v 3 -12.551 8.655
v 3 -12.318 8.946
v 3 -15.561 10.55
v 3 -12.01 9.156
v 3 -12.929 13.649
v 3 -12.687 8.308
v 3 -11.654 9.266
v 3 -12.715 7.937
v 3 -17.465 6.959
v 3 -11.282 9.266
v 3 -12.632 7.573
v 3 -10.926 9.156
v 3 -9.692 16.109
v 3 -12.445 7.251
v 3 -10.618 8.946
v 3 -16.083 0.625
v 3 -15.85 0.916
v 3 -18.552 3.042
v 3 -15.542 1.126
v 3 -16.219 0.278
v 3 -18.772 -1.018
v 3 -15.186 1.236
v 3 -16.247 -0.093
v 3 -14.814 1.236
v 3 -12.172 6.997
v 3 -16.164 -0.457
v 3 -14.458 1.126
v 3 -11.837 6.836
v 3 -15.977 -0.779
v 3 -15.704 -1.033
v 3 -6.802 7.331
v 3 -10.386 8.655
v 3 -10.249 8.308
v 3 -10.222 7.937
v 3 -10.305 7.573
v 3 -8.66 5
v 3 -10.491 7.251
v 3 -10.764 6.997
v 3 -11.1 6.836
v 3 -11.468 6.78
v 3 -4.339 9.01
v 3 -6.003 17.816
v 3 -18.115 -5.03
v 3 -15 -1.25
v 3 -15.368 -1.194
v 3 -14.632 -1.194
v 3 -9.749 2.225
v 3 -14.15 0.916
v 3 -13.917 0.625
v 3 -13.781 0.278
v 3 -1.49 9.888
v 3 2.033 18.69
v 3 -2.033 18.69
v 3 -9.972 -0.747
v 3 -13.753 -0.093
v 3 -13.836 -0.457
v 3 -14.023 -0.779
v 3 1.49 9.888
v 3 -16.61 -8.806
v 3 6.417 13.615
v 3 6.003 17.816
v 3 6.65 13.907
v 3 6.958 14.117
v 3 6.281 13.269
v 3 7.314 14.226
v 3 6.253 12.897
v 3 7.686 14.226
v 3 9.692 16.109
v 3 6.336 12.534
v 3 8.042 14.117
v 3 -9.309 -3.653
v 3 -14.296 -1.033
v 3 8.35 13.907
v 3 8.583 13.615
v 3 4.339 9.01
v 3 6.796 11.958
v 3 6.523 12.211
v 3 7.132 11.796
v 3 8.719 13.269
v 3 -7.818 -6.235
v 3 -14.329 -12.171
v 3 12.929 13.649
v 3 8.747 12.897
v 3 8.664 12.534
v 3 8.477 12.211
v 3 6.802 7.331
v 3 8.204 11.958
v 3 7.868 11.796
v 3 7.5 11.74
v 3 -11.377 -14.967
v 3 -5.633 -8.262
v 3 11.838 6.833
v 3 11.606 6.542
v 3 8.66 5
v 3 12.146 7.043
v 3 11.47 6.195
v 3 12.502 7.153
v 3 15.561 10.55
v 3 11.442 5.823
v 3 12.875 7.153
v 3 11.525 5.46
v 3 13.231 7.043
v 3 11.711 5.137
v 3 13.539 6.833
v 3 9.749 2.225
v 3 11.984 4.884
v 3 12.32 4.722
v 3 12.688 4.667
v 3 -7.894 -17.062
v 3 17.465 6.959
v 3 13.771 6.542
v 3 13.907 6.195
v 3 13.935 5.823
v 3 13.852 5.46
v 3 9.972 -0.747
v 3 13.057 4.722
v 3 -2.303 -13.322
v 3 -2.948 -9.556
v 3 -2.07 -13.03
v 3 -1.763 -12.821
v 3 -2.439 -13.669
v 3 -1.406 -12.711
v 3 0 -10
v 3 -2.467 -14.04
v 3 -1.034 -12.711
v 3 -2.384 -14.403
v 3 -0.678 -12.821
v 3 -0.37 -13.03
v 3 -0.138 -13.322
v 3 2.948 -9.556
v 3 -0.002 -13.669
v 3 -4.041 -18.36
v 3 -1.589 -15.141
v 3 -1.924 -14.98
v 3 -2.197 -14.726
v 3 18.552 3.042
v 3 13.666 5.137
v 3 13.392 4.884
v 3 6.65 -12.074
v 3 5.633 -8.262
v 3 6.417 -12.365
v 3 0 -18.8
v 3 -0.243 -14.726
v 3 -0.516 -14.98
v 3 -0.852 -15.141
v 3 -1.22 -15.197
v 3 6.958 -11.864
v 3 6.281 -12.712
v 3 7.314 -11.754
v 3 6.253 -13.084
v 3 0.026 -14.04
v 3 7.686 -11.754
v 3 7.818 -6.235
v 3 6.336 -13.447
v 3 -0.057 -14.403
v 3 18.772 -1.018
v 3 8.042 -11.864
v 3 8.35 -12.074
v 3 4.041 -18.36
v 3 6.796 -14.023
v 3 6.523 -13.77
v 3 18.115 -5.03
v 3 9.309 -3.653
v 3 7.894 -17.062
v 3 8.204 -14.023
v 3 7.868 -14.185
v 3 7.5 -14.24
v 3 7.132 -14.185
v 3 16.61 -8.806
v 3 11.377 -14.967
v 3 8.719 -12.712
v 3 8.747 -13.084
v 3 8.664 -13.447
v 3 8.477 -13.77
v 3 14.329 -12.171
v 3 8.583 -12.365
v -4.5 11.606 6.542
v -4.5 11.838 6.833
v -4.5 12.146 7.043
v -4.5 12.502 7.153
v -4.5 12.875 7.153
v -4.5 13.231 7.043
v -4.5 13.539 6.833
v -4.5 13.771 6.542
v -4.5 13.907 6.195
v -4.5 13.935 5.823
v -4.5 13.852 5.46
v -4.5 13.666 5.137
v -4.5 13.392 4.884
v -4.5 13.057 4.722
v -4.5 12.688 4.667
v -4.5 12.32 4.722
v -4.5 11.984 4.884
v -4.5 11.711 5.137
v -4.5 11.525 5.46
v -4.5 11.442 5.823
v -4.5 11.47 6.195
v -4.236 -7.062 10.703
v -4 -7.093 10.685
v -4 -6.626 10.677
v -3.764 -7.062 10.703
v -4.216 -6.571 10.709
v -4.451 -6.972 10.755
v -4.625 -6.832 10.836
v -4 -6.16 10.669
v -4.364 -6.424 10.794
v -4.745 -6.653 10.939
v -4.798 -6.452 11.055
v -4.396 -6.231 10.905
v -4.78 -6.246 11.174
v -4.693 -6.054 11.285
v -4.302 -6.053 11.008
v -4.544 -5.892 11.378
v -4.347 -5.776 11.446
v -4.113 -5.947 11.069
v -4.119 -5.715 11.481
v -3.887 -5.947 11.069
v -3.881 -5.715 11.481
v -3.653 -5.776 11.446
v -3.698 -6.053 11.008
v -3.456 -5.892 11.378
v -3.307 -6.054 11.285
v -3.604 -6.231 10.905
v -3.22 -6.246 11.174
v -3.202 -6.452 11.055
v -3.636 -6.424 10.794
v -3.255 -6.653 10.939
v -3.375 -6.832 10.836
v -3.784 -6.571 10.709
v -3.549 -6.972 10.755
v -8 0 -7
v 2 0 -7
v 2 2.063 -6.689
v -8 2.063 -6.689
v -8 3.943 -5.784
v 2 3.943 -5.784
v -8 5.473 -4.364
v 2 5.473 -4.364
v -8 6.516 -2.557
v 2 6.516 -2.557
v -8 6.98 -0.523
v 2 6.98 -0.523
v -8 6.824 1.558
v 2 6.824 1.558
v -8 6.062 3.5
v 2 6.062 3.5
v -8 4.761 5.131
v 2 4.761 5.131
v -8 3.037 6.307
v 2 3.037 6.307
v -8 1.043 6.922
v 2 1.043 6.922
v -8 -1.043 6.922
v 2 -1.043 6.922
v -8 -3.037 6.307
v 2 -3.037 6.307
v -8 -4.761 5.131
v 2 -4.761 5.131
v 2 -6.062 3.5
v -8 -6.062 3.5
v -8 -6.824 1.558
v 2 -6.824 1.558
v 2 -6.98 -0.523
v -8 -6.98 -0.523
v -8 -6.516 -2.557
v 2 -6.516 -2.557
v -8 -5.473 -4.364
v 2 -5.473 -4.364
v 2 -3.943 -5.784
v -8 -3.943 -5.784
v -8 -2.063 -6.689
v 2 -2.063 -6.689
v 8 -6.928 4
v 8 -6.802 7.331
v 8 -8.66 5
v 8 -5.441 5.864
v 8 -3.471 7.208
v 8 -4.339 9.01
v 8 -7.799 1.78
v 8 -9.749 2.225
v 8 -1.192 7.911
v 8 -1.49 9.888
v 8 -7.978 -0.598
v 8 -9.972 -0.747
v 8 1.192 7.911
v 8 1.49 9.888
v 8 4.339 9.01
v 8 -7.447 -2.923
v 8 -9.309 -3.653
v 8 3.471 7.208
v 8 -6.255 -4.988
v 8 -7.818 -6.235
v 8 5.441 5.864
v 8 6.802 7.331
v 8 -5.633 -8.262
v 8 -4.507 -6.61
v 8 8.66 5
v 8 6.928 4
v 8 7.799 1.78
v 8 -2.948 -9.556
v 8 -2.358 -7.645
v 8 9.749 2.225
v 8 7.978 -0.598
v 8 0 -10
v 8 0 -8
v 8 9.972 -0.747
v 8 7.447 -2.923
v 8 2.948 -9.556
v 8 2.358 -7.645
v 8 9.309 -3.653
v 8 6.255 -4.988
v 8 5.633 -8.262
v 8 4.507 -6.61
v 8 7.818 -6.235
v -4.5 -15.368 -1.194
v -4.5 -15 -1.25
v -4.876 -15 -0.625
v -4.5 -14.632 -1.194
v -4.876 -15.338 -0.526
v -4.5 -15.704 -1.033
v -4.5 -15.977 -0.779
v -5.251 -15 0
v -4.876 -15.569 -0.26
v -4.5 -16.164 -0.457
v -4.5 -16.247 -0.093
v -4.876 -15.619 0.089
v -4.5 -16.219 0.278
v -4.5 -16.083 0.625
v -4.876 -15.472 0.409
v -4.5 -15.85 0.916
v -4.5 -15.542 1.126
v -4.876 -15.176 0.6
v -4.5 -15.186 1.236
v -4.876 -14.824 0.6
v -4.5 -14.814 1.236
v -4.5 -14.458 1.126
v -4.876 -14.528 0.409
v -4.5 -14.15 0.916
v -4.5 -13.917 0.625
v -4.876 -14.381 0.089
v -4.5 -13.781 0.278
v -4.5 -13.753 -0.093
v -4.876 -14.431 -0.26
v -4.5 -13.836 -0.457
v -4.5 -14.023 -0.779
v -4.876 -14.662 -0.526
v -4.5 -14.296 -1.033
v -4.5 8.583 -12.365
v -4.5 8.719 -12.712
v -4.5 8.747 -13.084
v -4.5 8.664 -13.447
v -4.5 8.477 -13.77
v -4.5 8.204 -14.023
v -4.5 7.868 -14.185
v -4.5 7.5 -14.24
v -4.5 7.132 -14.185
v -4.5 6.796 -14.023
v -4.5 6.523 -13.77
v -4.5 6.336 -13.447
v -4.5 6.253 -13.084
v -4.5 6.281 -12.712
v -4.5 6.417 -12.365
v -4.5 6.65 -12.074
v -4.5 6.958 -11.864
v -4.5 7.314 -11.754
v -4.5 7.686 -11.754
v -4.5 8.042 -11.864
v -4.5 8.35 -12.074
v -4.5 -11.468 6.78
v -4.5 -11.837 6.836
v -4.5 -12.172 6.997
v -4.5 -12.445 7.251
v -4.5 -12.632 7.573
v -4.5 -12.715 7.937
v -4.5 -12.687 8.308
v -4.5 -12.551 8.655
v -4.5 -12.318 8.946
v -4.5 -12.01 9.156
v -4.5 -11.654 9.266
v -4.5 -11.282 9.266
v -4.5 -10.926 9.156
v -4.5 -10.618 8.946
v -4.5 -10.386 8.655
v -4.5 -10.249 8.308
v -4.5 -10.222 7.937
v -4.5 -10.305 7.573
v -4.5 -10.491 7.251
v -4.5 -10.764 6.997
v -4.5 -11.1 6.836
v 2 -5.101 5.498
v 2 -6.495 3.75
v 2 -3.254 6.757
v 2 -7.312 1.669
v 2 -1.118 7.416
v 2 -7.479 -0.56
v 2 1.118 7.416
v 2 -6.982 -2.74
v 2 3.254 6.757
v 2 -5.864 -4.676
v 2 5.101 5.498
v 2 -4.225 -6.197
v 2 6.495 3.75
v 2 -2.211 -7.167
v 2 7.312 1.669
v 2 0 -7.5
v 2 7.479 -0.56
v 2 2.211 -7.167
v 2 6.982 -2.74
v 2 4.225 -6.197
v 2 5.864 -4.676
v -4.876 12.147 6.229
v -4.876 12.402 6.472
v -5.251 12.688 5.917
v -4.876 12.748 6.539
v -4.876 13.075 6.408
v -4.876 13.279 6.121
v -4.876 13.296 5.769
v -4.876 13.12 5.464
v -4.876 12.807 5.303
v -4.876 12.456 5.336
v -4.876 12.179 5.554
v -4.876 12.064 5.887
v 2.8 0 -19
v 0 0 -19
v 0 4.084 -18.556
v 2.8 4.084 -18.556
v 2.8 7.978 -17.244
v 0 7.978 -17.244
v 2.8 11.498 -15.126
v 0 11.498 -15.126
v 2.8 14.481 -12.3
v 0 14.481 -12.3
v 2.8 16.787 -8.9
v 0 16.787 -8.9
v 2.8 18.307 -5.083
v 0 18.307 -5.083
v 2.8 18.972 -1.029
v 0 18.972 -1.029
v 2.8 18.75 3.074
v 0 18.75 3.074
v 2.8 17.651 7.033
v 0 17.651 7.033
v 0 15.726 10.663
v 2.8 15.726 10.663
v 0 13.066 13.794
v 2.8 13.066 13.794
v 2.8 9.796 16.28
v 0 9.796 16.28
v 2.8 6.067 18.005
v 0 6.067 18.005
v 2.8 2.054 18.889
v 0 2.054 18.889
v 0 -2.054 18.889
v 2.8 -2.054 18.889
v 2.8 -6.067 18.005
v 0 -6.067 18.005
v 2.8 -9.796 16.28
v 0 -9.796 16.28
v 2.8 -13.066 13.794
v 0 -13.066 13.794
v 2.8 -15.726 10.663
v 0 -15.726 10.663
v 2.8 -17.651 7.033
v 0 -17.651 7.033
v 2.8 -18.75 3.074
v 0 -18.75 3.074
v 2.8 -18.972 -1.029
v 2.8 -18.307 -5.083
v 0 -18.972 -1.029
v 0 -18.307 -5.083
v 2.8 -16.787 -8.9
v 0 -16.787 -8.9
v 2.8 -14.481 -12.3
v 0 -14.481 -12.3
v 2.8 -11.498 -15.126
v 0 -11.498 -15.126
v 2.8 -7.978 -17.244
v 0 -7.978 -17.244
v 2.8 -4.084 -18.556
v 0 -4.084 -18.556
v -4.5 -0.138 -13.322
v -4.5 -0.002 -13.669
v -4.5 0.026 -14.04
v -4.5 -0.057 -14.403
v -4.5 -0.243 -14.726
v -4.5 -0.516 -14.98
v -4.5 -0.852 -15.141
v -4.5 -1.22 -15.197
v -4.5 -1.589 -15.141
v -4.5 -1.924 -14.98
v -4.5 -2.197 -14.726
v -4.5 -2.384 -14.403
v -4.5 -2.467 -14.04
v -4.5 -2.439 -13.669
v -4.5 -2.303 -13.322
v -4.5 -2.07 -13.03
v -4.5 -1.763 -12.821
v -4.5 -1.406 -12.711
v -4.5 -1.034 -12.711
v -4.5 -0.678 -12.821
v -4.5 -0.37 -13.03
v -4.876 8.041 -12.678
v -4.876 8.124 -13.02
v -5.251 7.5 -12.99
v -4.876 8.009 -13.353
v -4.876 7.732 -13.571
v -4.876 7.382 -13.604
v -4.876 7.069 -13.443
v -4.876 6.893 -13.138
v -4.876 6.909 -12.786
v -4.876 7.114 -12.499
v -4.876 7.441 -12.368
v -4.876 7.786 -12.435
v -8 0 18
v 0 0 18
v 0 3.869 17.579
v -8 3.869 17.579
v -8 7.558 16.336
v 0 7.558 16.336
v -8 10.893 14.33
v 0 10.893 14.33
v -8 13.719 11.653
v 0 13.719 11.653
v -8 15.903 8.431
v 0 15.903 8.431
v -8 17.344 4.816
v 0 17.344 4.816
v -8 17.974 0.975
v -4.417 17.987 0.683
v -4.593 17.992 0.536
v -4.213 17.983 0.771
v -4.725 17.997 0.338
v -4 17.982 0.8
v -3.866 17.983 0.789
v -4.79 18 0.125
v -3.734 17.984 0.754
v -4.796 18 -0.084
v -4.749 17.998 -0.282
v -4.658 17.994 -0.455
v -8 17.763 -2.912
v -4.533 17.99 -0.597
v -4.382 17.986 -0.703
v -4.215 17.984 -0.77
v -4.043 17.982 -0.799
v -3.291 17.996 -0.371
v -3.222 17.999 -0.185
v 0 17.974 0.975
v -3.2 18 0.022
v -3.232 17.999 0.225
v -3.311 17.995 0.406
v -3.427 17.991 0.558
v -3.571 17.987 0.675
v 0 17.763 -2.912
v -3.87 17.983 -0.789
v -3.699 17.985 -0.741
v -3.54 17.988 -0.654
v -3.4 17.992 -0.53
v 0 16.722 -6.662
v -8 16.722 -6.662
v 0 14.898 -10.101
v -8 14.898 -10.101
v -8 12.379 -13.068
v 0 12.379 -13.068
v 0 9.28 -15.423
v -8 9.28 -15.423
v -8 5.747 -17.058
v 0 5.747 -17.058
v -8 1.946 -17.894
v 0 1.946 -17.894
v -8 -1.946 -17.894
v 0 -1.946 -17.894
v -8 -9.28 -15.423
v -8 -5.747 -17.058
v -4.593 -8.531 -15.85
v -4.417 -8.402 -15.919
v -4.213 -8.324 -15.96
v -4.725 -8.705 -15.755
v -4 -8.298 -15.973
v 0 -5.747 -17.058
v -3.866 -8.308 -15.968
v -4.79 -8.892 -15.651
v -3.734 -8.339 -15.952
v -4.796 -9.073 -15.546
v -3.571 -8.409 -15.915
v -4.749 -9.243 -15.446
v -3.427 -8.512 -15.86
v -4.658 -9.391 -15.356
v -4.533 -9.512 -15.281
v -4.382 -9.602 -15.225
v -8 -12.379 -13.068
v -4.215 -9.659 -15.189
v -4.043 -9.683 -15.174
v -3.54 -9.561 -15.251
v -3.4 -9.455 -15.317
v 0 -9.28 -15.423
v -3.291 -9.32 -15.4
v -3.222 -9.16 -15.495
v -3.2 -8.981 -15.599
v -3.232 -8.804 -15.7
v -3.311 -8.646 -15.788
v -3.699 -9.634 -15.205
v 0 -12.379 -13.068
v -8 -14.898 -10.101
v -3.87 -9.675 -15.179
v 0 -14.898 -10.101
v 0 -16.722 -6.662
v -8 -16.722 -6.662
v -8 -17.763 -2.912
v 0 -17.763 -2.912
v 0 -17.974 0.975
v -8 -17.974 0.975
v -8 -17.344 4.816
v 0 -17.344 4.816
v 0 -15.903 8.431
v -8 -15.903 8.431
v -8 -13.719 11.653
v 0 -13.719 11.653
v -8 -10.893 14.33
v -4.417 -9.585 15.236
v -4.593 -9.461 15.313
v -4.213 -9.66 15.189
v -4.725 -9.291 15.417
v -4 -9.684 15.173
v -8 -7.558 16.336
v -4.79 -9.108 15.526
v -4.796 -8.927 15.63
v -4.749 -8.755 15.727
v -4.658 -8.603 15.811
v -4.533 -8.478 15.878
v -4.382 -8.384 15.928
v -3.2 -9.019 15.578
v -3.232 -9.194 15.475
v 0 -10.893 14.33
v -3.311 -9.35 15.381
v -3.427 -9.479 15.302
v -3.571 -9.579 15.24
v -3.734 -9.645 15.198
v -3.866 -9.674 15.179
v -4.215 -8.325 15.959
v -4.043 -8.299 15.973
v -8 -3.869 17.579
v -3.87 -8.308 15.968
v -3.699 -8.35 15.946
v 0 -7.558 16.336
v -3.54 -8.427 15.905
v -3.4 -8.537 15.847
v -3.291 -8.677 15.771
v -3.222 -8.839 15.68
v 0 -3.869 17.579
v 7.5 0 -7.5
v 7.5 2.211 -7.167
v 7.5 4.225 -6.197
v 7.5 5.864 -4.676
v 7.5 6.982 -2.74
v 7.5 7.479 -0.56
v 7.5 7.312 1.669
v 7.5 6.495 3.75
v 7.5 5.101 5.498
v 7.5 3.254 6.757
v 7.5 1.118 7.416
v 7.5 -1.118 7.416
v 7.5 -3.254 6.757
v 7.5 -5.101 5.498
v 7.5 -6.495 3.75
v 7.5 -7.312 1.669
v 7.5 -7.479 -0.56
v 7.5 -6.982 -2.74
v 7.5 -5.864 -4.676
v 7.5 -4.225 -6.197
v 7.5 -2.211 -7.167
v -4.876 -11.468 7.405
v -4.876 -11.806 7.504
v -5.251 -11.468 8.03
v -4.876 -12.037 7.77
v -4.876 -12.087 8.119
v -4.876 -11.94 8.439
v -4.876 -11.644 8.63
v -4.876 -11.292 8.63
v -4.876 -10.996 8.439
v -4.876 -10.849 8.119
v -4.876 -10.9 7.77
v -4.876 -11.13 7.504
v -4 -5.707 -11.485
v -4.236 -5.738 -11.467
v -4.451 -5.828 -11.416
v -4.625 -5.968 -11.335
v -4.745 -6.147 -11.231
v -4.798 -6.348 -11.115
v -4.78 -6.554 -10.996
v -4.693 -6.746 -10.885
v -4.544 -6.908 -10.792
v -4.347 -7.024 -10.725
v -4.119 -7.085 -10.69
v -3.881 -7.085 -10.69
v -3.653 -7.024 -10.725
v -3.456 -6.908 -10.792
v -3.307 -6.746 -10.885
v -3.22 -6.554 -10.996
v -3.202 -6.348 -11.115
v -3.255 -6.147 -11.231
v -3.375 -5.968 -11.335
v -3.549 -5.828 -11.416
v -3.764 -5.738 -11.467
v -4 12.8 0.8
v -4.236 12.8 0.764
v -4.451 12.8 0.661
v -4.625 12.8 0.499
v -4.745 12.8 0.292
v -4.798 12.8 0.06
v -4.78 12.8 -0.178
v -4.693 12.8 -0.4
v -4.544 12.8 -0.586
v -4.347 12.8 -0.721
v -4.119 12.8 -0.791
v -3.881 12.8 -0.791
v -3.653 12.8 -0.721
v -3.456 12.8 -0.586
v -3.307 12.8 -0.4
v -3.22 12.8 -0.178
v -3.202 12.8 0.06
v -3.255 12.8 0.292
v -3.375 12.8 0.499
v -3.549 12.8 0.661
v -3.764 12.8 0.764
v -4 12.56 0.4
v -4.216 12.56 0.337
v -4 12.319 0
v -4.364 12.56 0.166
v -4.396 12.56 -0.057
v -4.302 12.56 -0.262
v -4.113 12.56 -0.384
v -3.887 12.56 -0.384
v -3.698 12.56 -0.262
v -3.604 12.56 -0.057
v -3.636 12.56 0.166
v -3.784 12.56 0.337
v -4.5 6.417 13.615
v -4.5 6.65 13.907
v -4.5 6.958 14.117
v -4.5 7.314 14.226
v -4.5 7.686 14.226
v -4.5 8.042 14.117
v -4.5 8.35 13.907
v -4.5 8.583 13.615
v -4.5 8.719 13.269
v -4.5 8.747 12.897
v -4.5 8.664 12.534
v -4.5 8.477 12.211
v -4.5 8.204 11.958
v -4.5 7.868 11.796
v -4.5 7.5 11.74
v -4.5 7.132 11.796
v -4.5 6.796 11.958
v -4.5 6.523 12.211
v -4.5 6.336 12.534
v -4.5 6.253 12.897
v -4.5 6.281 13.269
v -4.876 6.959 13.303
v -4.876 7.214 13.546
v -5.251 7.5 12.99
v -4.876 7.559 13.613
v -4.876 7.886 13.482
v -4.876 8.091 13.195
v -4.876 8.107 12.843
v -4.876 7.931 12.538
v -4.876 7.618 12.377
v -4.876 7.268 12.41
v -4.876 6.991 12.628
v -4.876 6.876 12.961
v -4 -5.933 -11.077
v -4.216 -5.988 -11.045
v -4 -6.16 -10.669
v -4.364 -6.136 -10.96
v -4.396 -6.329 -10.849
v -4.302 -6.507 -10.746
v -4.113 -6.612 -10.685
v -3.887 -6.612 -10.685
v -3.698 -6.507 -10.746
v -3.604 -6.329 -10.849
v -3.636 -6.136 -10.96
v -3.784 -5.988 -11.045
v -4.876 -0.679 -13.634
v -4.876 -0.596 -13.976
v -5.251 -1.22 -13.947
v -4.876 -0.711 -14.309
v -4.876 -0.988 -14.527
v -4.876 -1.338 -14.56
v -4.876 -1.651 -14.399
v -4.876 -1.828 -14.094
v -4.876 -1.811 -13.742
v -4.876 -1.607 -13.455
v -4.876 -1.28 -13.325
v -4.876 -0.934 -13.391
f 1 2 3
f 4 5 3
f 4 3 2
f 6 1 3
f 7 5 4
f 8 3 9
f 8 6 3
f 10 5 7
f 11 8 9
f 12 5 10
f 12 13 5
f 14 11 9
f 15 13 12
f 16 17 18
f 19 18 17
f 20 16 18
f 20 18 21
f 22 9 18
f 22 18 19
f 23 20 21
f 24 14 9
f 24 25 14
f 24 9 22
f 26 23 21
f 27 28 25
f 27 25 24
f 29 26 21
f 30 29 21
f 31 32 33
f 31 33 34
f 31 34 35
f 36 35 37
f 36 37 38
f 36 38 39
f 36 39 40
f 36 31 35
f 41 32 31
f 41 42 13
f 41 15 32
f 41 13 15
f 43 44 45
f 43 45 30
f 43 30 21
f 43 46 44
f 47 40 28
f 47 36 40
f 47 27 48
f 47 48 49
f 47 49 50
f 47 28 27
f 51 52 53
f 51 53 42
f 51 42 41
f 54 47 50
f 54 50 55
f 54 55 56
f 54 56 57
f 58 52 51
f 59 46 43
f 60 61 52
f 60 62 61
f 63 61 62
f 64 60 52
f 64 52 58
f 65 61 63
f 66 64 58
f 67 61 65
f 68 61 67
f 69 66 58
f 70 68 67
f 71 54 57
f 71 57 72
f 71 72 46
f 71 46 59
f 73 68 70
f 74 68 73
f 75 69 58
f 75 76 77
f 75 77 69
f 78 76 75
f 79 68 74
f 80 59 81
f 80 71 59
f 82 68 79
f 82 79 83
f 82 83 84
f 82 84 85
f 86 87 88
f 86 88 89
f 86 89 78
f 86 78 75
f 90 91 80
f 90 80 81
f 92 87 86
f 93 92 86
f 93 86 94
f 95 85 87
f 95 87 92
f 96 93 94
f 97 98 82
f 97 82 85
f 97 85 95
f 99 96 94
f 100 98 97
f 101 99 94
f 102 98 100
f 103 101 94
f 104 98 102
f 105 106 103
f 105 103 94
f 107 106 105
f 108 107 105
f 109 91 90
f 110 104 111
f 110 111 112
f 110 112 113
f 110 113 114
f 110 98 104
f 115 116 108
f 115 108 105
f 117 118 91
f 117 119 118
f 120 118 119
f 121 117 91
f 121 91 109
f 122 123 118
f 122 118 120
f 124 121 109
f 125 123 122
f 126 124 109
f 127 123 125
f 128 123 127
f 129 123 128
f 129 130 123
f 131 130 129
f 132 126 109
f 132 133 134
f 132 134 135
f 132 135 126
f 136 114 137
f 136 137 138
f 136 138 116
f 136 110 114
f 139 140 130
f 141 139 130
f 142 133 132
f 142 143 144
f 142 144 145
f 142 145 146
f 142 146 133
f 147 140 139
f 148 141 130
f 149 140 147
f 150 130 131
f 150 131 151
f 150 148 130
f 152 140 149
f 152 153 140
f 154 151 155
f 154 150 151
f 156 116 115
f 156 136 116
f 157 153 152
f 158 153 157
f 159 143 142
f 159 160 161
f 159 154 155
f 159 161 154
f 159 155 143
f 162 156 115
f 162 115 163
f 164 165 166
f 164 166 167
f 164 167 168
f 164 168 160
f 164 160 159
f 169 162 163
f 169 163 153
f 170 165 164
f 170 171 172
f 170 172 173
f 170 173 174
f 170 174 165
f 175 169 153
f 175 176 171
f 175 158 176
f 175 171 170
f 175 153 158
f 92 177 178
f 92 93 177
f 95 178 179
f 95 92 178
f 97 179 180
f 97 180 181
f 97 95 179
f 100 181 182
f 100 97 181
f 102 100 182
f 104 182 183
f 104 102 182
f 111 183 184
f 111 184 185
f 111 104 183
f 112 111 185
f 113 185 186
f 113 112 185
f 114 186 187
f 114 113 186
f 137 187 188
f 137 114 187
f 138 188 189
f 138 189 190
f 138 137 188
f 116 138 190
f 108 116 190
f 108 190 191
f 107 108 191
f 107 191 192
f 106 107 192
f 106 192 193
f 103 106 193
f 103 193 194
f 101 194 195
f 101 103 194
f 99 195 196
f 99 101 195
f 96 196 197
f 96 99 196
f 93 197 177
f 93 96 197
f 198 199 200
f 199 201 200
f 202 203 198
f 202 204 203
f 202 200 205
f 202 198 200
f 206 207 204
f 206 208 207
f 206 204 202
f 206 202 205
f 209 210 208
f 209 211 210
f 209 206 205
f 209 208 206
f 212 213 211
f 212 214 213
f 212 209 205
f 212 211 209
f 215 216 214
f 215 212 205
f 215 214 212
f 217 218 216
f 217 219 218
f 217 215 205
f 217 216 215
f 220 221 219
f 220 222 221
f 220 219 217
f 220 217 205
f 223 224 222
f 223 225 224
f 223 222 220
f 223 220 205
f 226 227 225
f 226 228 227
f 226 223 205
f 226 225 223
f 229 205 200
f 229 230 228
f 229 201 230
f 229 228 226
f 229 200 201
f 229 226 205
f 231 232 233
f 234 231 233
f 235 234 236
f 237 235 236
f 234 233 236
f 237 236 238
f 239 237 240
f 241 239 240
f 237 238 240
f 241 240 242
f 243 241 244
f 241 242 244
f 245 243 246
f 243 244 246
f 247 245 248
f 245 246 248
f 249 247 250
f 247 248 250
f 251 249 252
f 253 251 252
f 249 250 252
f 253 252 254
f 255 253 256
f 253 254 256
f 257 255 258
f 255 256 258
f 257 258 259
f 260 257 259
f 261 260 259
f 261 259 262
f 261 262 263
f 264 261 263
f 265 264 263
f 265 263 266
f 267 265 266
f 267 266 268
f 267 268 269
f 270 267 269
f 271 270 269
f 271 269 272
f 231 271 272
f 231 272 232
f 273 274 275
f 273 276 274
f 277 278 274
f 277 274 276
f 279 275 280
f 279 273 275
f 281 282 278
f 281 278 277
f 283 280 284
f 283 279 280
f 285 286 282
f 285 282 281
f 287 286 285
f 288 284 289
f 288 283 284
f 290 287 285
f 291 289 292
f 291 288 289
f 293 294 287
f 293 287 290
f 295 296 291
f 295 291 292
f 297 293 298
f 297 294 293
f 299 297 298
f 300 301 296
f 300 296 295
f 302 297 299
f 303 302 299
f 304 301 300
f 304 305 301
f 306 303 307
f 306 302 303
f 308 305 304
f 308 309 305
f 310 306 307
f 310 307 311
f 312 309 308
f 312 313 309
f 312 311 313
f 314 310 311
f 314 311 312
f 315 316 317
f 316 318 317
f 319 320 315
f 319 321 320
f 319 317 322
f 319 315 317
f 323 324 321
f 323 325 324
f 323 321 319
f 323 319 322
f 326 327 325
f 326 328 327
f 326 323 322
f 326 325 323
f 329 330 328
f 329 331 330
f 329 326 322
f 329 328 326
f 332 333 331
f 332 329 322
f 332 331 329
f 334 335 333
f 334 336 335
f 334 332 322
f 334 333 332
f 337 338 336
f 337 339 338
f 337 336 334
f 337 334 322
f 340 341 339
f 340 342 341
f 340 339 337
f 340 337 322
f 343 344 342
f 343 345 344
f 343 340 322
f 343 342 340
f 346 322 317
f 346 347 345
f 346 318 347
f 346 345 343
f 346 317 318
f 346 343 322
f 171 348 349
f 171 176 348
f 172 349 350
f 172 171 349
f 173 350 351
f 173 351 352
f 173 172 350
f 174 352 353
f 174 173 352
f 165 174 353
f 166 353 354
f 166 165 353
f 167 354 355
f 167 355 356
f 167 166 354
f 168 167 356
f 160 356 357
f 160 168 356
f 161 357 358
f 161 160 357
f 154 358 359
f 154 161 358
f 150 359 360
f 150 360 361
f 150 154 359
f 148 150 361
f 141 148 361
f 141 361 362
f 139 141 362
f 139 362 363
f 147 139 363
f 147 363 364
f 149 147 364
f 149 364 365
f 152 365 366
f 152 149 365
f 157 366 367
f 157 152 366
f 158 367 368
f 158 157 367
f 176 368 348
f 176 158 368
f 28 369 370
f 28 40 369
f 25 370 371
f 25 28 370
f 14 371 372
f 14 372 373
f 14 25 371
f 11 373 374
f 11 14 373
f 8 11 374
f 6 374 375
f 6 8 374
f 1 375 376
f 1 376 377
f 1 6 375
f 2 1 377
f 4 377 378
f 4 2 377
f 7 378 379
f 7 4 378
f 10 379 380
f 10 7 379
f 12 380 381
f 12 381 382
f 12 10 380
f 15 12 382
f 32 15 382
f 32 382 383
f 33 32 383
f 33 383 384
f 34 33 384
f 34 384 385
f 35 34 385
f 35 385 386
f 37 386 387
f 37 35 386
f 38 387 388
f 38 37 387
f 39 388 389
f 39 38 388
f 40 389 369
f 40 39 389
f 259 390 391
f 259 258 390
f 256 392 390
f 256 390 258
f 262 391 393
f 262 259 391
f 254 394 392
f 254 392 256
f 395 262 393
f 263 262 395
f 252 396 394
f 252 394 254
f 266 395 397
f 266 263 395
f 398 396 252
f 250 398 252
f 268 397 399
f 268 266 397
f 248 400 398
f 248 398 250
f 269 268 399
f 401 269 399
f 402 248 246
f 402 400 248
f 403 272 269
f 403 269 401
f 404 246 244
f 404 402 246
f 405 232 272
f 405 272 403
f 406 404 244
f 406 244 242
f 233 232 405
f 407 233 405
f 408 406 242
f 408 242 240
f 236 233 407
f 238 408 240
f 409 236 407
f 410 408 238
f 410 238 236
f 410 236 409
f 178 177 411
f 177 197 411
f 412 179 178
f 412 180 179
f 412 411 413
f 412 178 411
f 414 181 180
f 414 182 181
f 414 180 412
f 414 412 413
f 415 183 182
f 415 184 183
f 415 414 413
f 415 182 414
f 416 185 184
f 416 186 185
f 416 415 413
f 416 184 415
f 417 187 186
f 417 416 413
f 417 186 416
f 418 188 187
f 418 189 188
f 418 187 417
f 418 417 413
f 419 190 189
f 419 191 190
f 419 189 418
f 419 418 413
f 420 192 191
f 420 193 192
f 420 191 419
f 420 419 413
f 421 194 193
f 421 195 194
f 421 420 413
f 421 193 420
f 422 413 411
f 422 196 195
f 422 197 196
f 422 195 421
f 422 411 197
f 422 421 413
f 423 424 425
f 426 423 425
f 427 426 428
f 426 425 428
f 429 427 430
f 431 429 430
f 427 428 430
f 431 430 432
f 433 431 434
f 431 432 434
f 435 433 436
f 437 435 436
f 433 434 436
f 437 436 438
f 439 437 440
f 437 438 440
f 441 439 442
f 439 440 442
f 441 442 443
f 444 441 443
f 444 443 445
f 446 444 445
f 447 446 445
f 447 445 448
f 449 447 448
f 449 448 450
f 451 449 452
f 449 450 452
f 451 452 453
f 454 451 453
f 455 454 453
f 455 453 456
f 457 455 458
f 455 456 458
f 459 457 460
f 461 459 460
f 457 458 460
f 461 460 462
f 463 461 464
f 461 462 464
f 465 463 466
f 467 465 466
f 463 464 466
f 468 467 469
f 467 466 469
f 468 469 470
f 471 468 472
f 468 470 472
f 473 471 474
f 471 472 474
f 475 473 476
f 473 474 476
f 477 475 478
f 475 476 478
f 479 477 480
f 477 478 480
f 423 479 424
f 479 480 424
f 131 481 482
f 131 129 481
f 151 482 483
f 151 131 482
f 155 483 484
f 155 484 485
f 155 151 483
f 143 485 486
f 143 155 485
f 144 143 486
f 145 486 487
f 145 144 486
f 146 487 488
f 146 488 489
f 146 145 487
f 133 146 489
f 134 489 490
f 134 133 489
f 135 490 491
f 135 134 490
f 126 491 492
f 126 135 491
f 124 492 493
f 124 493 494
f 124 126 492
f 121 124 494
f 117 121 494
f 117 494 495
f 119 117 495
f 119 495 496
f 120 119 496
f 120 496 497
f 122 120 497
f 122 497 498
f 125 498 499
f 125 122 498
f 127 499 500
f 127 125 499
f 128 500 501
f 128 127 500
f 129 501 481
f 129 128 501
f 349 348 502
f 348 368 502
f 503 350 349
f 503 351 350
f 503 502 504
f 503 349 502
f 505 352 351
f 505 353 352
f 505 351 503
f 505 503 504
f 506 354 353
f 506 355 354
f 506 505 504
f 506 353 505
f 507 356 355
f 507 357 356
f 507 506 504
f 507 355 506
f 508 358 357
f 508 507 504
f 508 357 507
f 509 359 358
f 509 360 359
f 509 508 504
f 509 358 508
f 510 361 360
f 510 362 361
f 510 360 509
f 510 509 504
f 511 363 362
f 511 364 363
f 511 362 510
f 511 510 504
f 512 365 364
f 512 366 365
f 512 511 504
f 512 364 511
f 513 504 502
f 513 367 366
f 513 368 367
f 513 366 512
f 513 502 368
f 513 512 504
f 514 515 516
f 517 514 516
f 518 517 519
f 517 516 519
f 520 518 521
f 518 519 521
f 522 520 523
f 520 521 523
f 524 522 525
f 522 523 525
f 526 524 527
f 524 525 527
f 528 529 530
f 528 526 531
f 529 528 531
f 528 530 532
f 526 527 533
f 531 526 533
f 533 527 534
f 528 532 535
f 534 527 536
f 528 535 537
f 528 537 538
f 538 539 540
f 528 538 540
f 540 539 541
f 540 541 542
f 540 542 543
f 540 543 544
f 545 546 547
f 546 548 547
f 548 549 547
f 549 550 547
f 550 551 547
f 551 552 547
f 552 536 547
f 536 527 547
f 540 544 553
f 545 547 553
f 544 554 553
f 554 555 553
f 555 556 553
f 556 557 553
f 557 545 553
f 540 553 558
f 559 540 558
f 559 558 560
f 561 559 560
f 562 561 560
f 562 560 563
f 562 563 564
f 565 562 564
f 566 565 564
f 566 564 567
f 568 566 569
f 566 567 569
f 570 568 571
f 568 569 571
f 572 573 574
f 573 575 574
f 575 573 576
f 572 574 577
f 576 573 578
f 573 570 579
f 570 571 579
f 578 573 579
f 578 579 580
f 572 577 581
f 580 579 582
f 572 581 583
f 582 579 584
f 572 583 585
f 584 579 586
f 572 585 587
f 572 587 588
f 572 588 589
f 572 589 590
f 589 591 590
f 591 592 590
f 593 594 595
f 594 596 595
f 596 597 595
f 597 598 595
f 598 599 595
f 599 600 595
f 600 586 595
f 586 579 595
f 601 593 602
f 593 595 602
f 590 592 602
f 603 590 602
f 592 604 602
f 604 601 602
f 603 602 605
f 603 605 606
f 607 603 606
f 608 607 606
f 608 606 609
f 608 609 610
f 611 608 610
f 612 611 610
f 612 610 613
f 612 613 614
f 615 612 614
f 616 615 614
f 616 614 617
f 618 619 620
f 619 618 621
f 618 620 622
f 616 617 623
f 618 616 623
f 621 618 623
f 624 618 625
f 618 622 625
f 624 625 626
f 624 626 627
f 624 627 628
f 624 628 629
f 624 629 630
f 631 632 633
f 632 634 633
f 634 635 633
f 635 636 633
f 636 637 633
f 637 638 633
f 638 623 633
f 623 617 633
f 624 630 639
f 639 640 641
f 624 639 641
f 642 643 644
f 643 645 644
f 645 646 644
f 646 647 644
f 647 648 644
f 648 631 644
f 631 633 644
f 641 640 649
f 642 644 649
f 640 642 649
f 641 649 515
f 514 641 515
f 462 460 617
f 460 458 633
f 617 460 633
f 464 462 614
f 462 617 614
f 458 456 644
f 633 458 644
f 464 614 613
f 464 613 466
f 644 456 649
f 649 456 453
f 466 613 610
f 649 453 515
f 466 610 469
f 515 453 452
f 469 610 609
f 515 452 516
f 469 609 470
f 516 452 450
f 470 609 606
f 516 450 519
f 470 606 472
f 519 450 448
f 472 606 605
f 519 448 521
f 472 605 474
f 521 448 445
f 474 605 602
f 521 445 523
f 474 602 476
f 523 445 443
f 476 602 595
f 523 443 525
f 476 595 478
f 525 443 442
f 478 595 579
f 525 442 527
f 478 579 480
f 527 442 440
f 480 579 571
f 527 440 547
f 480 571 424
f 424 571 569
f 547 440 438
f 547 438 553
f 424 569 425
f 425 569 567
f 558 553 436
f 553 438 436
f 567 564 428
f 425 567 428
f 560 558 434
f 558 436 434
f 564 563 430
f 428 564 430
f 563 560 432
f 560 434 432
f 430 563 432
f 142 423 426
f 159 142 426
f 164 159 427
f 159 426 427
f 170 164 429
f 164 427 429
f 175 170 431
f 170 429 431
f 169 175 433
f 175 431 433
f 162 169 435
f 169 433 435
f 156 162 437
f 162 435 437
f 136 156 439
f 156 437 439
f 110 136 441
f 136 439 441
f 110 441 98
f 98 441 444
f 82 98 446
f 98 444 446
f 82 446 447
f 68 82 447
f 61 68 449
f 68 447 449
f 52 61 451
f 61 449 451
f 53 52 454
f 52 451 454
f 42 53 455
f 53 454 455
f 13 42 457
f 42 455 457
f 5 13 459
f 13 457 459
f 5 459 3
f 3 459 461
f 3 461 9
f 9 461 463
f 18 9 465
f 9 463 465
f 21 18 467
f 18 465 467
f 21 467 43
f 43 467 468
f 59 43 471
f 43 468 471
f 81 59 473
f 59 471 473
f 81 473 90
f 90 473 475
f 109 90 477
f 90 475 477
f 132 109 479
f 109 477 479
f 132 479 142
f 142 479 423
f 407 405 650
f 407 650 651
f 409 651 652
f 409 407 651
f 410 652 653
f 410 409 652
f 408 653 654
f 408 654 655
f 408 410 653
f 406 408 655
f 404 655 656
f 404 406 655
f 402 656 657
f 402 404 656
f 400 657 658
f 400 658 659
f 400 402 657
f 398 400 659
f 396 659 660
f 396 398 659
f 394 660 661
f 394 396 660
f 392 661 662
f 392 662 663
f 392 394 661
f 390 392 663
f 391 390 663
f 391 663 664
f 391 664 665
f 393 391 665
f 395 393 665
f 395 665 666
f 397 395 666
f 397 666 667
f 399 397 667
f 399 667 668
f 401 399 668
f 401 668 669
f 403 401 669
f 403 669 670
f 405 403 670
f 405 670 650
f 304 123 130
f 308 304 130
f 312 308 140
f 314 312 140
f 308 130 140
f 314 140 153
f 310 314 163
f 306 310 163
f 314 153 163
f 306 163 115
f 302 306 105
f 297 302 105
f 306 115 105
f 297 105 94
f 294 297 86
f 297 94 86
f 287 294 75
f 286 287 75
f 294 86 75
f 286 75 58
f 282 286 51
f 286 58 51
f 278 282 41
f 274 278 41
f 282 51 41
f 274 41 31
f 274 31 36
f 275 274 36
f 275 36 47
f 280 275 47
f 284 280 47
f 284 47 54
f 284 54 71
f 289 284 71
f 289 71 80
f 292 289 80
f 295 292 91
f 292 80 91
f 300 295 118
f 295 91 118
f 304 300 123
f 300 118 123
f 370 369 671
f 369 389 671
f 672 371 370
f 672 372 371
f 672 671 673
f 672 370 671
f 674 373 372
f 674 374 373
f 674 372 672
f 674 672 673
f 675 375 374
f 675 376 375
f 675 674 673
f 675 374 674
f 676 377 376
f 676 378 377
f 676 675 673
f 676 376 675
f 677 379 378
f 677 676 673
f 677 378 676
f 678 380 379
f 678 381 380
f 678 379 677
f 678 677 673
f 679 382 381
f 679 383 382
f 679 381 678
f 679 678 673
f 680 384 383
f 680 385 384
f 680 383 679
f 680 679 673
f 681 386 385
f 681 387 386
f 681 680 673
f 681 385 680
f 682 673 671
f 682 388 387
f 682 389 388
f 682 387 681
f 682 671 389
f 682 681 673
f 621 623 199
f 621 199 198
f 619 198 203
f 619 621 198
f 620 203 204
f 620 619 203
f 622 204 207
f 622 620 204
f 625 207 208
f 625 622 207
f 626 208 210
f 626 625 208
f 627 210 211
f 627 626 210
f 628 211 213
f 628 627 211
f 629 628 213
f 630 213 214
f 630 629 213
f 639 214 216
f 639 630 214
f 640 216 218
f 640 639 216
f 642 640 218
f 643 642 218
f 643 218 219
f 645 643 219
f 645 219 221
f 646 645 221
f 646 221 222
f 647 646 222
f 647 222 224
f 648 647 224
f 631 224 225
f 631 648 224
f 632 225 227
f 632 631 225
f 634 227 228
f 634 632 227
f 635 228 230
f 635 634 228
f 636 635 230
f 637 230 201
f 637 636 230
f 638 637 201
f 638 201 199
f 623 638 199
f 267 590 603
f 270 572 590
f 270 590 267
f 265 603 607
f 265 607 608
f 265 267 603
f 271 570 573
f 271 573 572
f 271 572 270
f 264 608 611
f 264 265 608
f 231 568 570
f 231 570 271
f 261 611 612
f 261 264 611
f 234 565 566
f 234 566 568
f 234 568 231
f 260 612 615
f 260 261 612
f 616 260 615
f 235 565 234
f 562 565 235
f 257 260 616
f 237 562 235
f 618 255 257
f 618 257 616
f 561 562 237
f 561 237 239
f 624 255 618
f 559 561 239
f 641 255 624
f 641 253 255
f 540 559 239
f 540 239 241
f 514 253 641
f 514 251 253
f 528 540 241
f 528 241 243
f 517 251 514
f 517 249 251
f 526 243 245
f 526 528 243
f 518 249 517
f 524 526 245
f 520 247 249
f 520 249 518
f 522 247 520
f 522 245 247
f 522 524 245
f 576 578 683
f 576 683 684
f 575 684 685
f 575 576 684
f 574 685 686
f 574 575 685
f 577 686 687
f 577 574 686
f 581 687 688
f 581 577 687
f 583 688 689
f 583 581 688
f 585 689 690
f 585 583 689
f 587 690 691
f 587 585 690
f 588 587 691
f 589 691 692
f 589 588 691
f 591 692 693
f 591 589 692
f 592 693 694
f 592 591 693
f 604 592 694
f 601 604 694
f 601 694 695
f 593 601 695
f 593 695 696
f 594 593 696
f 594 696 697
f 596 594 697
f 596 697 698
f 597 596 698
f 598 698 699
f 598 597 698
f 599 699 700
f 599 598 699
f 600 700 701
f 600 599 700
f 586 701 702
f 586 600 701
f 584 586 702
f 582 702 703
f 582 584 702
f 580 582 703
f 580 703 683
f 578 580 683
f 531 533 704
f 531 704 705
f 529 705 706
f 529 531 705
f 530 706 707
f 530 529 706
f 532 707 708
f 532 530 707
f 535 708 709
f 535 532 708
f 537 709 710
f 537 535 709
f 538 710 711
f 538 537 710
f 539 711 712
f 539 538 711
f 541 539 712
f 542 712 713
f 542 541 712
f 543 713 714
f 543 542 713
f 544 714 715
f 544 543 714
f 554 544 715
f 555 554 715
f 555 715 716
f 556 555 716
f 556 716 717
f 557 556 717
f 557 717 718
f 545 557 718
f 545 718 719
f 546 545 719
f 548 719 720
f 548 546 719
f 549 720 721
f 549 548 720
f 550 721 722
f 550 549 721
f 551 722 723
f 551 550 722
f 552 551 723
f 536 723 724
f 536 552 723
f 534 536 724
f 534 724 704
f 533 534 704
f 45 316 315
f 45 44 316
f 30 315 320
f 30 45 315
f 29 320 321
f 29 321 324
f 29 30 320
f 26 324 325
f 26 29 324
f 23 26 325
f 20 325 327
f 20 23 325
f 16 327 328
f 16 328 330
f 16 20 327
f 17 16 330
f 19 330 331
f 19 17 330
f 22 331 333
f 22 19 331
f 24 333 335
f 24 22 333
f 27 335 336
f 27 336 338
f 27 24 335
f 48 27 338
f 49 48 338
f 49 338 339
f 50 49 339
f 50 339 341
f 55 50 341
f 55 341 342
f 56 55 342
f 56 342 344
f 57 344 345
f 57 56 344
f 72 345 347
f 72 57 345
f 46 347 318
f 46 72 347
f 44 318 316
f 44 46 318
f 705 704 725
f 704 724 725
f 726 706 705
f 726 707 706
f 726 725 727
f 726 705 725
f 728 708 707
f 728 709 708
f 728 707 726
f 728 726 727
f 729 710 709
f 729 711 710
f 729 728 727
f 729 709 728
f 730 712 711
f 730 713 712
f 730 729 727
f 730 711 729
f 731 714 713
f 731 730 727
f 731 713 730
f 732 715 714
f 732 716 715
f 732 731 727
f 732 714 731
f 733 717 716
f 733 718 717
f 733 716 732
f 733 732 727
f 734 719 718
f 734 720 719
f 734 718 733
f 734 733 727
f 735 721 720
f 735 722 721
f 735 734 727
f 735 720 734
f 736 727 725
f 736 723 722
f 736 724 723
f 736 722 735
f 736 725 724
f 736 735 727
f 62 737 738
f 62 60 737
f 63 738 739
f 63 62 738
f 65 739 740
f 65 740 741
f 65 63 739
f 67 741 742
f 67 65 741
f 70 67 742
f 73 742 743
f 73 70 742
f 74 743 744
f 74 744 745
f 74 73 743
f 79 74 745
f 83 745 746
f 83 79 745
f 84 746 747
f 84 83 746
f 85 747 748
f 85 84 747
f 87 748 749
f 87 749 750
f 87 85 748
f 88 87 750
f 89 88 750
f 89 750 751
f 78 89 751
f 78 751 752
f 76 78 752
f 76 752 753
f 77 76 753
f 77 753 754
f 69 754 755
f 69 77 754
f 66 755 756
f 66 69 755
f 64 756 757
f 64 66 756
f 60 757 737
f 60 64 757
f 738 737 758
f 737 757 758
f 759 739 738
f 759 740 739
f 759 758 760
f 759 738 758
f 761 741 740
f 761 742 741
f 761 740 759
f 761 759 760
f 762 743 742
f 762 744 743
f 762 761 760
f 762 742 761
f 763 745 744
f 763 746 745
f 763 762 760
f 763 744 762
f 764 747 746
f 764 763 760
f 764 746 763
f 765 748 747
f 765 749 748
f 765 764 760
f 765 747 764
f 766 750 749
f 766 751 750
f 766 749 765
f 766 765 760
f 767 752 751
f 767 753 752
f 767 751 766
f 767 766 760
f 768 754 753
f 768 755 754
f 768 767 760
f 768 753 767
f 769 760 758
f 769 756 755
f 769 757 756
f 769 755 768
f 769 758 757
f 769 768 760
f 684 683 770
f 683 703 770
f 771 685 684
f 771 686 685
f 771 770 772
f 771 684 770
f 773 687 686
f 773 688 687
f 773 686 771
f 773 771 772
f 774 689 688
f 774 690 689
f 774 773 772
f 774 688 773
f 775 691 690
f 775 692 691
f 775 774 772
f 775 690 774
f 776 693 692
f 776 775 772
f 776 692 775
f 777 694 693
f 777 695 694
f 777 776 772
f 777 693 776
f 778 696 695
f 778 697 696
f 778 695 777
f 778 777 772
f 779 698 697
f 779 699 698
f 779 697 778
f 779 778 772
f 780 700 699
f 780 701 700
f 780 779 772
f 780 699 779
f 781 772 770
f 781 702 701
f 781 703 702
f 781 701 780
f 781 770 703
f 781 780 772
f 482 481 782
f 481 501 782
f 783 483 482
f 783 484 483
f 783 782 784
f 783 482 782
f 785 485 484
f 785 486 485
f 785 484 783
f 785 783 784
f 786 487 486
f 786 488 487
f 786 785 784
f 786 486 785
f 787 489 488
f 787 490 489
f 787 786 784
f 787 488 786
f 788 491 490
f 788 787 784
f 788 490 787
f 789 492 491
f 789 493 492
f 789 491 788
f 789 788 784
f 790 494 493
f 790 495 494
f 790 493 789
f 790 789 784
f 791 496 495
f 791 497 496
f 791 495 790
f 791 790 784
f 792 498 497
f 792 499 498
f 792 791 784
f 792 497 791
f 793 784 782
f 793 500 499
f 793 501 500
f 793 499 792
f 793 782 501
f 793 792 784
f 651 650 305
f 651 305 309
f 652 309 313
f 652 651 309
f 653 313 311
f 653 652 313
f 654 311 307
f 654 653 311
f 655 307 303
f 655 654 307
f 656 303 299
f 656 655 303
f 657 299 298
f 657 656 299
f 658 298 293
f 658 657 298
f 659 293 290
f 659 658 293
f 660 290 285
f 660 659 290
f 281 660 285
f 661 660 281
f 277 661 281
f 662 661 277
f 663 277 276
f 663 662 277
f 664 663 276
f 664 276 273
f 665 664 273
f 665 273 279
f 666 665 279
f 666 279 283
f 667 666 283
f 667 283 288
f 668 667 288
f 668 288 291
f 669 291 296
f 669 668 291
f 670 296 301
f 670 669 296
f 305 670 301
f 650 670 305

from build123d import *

# Parameters (mm, degrees)
BASES_R                  = 19
BASE_DEPTH               = 3
WALLS_R                  = 10
WALLS_R_2                = 7.5
WALL_DEPTH               = 5
FASTENINGBODYS_R         = 18
FASTENINGBODY_DEPTH      = 8
CIRPATTERN1_COUNT        = 3
BEARINGACCESSBORES_R     = 7
BEARINGACCESSBORE_DEPTH  = 30.03446232
ADDITIONALDEPTHCUT_START = -1
ADDITIONALDEPTHCUTS_R    = 7.5
ADDITIONALDEPTHCUT_DEPTH = 1
CIRPATTERN2_COUNT        = 3
CIRPATTERN3_COUNT        = 3
CHAMFER1_SIZE            = 0.5
CHAMFER2_SIZE            = 0.2


with BuildPart() as part:
    # BaseS → Base (new body)
    with BuildSketch(Plane(origin=(0, 0, 0), x_dir=(0, 0, -1), z_dir=(1, 0, 0))):
        Circle(BASES_R)
    extrude(amount=BASE_DEPTH)

    # WallS → Wall (add)
    with BuildSketch(Plane(origin=(3, 0, 0), x_dir=(0, 0, -1), z_dir=(1, 0, 0))):
        Circle(WALLS_R)
        Circle(WALLS_R_2, mode=Mode.SUBTRACT)
    extrude(amount=WALL_DEPTH)

    # FasteningBodyS → FasteningBody (add)
    with BuildSketch(Plane.ZY):
        Circle(FASTENINGBODYS_R)
    extrude(amount=FASTENINGBODY_DEPTH)

    # Sketch5 → M2x0.4 Tapped Hole1 (revolve, cut)
    with BuildSketch(Plane(origin=(-4, 18, 0), x_dir=(0, 0, 1), z_dir=(1, 0, 0))):
        Polygon((0, 0), (0, 5.680688495), (0.8, 5.2), (0.8, 0), align=None)
    m2x0_4_tapped_hole1 = revolve(axis=Axis((-4, 24.35, 0), (0, -1, 0)), mode=Mode.SUBTRACT)

    # CirPattern1: M2x0.4 Tapped Hole1 ×3 about axis
    cirpattern1_axis = Axis((-8, 0, 0), (1, 0, 0))
    for i in range(1, CIRPATTERN1_COUNT):
        add(m2x0_4_tapped_hole1.rotate(cirpattern1_axis, i * 360 / CIRPATTERN1_COUNT), mode=Mode.SUBTRACT)

    # BearingAccessBoreS → BearingAccessBore (cut, through all)
    with BuildSketch(Plane(origin=(3, 0, 0), x_dir=(0, 0, -1), z_dir=(1, 0, 0))):
        Circle(BEARINGACCESSBORES_R)
    extrude(amount=-BEARINGACCESSBORE_DEPTH, mode=Mode.SUBTRACT)

    # AdditionalDepthCutS → AdditionalDepthCut (cut)
    with BuildSketch(Plane(origin=(3, 0, 0), x_dir=(0, 0, -1), z_dir=(1, 0, 0)).offset(ADDITIONALDEPTHCUT_START)):
        Circle(ADDITIONALDEPTHCUTS_R)
    extrude(amount=ADDITIONALDEPTHCUT_DEPTH, mode=Mode.SUBTRACT)

    # Sketch11 → M3x0.5 Tapped Hole2 (revolve, cut)
    with BuildSketch(Plane(origin=(3, -15, 0), x_dir=(0, 0, -1), z_dir=(0, 1, 0))):
        Polygon((0, 0), (0, 8.251075774), (1.25, 7.5), (1.25, 0), align=None)
    m3x0_5_tapped_hole2 = revolve(axis=Axis((9.35, -15, 0), (-1, 0, 0)), mode=Mode.SUBTRACT)

    # Sketch8 → M3x0.5 Tapped Hole1 (revolve, cut)
    with BuildSketch(Plane(origin=(3, -11.46812862, 8.030070109), x_dir=(0, 0, -1), z_dir=(0, 1, 0))):
        Polygon((0, 0), (0, 8.251075774), (1.25, 7.5), (1.25, 0), align=None)
    m3x0_5_tapped_hole1 = revolve(axis=Axis((9.35, -11.46812862, 8.030070109), (-1, 0, 0)), mode=Mode.SUBTRACT)

    # CirPattern2: M3x0.5 Tapped Hole1 ×3 about axis
    cirpattern2_axis = Axis((0, 0, 0), (1, 0, 0))
    for i in range(1, CIRPATTERN2_COUNT):
        add(m3x0_5_tapped_hole1.rotate(cirpattern2_axis, i * 360 / CIRPATTERN2_COUNT), mode=Mode.SUBTRACT)

    # CirPattern3: M3x0.5 Tapped Hole2 ×3 about axis
    cirpattern3_axis = Axis((0, 0, 0), (1, 0, 0))
    for i in range(1, CIRPATTERN3_COUNT):
        add(m3x0_5_tapped_hole2.rotate(cirpattern3_axis, i * 360 / CIRPATTERN3_COUNT), mode=Mode.SUBTRACT)

    # Chamfer1
    chamfer1_edges = [part.edges().sort_by_distance(p)[0] for p in [
        (8, 0, 7.5),
    ]]
    chamfer(chamfer1_edges, length=CHAMFER1_SIZE)

    # Chamfer2
    chamfer2_edges = [part.edges().sort_by_distance(p)[0] for p in [
        (3, 0, 19),
    ]]
    chamfer(chamfer2_edges, length=CHAMFER2_SIZE)


solid = part.part
